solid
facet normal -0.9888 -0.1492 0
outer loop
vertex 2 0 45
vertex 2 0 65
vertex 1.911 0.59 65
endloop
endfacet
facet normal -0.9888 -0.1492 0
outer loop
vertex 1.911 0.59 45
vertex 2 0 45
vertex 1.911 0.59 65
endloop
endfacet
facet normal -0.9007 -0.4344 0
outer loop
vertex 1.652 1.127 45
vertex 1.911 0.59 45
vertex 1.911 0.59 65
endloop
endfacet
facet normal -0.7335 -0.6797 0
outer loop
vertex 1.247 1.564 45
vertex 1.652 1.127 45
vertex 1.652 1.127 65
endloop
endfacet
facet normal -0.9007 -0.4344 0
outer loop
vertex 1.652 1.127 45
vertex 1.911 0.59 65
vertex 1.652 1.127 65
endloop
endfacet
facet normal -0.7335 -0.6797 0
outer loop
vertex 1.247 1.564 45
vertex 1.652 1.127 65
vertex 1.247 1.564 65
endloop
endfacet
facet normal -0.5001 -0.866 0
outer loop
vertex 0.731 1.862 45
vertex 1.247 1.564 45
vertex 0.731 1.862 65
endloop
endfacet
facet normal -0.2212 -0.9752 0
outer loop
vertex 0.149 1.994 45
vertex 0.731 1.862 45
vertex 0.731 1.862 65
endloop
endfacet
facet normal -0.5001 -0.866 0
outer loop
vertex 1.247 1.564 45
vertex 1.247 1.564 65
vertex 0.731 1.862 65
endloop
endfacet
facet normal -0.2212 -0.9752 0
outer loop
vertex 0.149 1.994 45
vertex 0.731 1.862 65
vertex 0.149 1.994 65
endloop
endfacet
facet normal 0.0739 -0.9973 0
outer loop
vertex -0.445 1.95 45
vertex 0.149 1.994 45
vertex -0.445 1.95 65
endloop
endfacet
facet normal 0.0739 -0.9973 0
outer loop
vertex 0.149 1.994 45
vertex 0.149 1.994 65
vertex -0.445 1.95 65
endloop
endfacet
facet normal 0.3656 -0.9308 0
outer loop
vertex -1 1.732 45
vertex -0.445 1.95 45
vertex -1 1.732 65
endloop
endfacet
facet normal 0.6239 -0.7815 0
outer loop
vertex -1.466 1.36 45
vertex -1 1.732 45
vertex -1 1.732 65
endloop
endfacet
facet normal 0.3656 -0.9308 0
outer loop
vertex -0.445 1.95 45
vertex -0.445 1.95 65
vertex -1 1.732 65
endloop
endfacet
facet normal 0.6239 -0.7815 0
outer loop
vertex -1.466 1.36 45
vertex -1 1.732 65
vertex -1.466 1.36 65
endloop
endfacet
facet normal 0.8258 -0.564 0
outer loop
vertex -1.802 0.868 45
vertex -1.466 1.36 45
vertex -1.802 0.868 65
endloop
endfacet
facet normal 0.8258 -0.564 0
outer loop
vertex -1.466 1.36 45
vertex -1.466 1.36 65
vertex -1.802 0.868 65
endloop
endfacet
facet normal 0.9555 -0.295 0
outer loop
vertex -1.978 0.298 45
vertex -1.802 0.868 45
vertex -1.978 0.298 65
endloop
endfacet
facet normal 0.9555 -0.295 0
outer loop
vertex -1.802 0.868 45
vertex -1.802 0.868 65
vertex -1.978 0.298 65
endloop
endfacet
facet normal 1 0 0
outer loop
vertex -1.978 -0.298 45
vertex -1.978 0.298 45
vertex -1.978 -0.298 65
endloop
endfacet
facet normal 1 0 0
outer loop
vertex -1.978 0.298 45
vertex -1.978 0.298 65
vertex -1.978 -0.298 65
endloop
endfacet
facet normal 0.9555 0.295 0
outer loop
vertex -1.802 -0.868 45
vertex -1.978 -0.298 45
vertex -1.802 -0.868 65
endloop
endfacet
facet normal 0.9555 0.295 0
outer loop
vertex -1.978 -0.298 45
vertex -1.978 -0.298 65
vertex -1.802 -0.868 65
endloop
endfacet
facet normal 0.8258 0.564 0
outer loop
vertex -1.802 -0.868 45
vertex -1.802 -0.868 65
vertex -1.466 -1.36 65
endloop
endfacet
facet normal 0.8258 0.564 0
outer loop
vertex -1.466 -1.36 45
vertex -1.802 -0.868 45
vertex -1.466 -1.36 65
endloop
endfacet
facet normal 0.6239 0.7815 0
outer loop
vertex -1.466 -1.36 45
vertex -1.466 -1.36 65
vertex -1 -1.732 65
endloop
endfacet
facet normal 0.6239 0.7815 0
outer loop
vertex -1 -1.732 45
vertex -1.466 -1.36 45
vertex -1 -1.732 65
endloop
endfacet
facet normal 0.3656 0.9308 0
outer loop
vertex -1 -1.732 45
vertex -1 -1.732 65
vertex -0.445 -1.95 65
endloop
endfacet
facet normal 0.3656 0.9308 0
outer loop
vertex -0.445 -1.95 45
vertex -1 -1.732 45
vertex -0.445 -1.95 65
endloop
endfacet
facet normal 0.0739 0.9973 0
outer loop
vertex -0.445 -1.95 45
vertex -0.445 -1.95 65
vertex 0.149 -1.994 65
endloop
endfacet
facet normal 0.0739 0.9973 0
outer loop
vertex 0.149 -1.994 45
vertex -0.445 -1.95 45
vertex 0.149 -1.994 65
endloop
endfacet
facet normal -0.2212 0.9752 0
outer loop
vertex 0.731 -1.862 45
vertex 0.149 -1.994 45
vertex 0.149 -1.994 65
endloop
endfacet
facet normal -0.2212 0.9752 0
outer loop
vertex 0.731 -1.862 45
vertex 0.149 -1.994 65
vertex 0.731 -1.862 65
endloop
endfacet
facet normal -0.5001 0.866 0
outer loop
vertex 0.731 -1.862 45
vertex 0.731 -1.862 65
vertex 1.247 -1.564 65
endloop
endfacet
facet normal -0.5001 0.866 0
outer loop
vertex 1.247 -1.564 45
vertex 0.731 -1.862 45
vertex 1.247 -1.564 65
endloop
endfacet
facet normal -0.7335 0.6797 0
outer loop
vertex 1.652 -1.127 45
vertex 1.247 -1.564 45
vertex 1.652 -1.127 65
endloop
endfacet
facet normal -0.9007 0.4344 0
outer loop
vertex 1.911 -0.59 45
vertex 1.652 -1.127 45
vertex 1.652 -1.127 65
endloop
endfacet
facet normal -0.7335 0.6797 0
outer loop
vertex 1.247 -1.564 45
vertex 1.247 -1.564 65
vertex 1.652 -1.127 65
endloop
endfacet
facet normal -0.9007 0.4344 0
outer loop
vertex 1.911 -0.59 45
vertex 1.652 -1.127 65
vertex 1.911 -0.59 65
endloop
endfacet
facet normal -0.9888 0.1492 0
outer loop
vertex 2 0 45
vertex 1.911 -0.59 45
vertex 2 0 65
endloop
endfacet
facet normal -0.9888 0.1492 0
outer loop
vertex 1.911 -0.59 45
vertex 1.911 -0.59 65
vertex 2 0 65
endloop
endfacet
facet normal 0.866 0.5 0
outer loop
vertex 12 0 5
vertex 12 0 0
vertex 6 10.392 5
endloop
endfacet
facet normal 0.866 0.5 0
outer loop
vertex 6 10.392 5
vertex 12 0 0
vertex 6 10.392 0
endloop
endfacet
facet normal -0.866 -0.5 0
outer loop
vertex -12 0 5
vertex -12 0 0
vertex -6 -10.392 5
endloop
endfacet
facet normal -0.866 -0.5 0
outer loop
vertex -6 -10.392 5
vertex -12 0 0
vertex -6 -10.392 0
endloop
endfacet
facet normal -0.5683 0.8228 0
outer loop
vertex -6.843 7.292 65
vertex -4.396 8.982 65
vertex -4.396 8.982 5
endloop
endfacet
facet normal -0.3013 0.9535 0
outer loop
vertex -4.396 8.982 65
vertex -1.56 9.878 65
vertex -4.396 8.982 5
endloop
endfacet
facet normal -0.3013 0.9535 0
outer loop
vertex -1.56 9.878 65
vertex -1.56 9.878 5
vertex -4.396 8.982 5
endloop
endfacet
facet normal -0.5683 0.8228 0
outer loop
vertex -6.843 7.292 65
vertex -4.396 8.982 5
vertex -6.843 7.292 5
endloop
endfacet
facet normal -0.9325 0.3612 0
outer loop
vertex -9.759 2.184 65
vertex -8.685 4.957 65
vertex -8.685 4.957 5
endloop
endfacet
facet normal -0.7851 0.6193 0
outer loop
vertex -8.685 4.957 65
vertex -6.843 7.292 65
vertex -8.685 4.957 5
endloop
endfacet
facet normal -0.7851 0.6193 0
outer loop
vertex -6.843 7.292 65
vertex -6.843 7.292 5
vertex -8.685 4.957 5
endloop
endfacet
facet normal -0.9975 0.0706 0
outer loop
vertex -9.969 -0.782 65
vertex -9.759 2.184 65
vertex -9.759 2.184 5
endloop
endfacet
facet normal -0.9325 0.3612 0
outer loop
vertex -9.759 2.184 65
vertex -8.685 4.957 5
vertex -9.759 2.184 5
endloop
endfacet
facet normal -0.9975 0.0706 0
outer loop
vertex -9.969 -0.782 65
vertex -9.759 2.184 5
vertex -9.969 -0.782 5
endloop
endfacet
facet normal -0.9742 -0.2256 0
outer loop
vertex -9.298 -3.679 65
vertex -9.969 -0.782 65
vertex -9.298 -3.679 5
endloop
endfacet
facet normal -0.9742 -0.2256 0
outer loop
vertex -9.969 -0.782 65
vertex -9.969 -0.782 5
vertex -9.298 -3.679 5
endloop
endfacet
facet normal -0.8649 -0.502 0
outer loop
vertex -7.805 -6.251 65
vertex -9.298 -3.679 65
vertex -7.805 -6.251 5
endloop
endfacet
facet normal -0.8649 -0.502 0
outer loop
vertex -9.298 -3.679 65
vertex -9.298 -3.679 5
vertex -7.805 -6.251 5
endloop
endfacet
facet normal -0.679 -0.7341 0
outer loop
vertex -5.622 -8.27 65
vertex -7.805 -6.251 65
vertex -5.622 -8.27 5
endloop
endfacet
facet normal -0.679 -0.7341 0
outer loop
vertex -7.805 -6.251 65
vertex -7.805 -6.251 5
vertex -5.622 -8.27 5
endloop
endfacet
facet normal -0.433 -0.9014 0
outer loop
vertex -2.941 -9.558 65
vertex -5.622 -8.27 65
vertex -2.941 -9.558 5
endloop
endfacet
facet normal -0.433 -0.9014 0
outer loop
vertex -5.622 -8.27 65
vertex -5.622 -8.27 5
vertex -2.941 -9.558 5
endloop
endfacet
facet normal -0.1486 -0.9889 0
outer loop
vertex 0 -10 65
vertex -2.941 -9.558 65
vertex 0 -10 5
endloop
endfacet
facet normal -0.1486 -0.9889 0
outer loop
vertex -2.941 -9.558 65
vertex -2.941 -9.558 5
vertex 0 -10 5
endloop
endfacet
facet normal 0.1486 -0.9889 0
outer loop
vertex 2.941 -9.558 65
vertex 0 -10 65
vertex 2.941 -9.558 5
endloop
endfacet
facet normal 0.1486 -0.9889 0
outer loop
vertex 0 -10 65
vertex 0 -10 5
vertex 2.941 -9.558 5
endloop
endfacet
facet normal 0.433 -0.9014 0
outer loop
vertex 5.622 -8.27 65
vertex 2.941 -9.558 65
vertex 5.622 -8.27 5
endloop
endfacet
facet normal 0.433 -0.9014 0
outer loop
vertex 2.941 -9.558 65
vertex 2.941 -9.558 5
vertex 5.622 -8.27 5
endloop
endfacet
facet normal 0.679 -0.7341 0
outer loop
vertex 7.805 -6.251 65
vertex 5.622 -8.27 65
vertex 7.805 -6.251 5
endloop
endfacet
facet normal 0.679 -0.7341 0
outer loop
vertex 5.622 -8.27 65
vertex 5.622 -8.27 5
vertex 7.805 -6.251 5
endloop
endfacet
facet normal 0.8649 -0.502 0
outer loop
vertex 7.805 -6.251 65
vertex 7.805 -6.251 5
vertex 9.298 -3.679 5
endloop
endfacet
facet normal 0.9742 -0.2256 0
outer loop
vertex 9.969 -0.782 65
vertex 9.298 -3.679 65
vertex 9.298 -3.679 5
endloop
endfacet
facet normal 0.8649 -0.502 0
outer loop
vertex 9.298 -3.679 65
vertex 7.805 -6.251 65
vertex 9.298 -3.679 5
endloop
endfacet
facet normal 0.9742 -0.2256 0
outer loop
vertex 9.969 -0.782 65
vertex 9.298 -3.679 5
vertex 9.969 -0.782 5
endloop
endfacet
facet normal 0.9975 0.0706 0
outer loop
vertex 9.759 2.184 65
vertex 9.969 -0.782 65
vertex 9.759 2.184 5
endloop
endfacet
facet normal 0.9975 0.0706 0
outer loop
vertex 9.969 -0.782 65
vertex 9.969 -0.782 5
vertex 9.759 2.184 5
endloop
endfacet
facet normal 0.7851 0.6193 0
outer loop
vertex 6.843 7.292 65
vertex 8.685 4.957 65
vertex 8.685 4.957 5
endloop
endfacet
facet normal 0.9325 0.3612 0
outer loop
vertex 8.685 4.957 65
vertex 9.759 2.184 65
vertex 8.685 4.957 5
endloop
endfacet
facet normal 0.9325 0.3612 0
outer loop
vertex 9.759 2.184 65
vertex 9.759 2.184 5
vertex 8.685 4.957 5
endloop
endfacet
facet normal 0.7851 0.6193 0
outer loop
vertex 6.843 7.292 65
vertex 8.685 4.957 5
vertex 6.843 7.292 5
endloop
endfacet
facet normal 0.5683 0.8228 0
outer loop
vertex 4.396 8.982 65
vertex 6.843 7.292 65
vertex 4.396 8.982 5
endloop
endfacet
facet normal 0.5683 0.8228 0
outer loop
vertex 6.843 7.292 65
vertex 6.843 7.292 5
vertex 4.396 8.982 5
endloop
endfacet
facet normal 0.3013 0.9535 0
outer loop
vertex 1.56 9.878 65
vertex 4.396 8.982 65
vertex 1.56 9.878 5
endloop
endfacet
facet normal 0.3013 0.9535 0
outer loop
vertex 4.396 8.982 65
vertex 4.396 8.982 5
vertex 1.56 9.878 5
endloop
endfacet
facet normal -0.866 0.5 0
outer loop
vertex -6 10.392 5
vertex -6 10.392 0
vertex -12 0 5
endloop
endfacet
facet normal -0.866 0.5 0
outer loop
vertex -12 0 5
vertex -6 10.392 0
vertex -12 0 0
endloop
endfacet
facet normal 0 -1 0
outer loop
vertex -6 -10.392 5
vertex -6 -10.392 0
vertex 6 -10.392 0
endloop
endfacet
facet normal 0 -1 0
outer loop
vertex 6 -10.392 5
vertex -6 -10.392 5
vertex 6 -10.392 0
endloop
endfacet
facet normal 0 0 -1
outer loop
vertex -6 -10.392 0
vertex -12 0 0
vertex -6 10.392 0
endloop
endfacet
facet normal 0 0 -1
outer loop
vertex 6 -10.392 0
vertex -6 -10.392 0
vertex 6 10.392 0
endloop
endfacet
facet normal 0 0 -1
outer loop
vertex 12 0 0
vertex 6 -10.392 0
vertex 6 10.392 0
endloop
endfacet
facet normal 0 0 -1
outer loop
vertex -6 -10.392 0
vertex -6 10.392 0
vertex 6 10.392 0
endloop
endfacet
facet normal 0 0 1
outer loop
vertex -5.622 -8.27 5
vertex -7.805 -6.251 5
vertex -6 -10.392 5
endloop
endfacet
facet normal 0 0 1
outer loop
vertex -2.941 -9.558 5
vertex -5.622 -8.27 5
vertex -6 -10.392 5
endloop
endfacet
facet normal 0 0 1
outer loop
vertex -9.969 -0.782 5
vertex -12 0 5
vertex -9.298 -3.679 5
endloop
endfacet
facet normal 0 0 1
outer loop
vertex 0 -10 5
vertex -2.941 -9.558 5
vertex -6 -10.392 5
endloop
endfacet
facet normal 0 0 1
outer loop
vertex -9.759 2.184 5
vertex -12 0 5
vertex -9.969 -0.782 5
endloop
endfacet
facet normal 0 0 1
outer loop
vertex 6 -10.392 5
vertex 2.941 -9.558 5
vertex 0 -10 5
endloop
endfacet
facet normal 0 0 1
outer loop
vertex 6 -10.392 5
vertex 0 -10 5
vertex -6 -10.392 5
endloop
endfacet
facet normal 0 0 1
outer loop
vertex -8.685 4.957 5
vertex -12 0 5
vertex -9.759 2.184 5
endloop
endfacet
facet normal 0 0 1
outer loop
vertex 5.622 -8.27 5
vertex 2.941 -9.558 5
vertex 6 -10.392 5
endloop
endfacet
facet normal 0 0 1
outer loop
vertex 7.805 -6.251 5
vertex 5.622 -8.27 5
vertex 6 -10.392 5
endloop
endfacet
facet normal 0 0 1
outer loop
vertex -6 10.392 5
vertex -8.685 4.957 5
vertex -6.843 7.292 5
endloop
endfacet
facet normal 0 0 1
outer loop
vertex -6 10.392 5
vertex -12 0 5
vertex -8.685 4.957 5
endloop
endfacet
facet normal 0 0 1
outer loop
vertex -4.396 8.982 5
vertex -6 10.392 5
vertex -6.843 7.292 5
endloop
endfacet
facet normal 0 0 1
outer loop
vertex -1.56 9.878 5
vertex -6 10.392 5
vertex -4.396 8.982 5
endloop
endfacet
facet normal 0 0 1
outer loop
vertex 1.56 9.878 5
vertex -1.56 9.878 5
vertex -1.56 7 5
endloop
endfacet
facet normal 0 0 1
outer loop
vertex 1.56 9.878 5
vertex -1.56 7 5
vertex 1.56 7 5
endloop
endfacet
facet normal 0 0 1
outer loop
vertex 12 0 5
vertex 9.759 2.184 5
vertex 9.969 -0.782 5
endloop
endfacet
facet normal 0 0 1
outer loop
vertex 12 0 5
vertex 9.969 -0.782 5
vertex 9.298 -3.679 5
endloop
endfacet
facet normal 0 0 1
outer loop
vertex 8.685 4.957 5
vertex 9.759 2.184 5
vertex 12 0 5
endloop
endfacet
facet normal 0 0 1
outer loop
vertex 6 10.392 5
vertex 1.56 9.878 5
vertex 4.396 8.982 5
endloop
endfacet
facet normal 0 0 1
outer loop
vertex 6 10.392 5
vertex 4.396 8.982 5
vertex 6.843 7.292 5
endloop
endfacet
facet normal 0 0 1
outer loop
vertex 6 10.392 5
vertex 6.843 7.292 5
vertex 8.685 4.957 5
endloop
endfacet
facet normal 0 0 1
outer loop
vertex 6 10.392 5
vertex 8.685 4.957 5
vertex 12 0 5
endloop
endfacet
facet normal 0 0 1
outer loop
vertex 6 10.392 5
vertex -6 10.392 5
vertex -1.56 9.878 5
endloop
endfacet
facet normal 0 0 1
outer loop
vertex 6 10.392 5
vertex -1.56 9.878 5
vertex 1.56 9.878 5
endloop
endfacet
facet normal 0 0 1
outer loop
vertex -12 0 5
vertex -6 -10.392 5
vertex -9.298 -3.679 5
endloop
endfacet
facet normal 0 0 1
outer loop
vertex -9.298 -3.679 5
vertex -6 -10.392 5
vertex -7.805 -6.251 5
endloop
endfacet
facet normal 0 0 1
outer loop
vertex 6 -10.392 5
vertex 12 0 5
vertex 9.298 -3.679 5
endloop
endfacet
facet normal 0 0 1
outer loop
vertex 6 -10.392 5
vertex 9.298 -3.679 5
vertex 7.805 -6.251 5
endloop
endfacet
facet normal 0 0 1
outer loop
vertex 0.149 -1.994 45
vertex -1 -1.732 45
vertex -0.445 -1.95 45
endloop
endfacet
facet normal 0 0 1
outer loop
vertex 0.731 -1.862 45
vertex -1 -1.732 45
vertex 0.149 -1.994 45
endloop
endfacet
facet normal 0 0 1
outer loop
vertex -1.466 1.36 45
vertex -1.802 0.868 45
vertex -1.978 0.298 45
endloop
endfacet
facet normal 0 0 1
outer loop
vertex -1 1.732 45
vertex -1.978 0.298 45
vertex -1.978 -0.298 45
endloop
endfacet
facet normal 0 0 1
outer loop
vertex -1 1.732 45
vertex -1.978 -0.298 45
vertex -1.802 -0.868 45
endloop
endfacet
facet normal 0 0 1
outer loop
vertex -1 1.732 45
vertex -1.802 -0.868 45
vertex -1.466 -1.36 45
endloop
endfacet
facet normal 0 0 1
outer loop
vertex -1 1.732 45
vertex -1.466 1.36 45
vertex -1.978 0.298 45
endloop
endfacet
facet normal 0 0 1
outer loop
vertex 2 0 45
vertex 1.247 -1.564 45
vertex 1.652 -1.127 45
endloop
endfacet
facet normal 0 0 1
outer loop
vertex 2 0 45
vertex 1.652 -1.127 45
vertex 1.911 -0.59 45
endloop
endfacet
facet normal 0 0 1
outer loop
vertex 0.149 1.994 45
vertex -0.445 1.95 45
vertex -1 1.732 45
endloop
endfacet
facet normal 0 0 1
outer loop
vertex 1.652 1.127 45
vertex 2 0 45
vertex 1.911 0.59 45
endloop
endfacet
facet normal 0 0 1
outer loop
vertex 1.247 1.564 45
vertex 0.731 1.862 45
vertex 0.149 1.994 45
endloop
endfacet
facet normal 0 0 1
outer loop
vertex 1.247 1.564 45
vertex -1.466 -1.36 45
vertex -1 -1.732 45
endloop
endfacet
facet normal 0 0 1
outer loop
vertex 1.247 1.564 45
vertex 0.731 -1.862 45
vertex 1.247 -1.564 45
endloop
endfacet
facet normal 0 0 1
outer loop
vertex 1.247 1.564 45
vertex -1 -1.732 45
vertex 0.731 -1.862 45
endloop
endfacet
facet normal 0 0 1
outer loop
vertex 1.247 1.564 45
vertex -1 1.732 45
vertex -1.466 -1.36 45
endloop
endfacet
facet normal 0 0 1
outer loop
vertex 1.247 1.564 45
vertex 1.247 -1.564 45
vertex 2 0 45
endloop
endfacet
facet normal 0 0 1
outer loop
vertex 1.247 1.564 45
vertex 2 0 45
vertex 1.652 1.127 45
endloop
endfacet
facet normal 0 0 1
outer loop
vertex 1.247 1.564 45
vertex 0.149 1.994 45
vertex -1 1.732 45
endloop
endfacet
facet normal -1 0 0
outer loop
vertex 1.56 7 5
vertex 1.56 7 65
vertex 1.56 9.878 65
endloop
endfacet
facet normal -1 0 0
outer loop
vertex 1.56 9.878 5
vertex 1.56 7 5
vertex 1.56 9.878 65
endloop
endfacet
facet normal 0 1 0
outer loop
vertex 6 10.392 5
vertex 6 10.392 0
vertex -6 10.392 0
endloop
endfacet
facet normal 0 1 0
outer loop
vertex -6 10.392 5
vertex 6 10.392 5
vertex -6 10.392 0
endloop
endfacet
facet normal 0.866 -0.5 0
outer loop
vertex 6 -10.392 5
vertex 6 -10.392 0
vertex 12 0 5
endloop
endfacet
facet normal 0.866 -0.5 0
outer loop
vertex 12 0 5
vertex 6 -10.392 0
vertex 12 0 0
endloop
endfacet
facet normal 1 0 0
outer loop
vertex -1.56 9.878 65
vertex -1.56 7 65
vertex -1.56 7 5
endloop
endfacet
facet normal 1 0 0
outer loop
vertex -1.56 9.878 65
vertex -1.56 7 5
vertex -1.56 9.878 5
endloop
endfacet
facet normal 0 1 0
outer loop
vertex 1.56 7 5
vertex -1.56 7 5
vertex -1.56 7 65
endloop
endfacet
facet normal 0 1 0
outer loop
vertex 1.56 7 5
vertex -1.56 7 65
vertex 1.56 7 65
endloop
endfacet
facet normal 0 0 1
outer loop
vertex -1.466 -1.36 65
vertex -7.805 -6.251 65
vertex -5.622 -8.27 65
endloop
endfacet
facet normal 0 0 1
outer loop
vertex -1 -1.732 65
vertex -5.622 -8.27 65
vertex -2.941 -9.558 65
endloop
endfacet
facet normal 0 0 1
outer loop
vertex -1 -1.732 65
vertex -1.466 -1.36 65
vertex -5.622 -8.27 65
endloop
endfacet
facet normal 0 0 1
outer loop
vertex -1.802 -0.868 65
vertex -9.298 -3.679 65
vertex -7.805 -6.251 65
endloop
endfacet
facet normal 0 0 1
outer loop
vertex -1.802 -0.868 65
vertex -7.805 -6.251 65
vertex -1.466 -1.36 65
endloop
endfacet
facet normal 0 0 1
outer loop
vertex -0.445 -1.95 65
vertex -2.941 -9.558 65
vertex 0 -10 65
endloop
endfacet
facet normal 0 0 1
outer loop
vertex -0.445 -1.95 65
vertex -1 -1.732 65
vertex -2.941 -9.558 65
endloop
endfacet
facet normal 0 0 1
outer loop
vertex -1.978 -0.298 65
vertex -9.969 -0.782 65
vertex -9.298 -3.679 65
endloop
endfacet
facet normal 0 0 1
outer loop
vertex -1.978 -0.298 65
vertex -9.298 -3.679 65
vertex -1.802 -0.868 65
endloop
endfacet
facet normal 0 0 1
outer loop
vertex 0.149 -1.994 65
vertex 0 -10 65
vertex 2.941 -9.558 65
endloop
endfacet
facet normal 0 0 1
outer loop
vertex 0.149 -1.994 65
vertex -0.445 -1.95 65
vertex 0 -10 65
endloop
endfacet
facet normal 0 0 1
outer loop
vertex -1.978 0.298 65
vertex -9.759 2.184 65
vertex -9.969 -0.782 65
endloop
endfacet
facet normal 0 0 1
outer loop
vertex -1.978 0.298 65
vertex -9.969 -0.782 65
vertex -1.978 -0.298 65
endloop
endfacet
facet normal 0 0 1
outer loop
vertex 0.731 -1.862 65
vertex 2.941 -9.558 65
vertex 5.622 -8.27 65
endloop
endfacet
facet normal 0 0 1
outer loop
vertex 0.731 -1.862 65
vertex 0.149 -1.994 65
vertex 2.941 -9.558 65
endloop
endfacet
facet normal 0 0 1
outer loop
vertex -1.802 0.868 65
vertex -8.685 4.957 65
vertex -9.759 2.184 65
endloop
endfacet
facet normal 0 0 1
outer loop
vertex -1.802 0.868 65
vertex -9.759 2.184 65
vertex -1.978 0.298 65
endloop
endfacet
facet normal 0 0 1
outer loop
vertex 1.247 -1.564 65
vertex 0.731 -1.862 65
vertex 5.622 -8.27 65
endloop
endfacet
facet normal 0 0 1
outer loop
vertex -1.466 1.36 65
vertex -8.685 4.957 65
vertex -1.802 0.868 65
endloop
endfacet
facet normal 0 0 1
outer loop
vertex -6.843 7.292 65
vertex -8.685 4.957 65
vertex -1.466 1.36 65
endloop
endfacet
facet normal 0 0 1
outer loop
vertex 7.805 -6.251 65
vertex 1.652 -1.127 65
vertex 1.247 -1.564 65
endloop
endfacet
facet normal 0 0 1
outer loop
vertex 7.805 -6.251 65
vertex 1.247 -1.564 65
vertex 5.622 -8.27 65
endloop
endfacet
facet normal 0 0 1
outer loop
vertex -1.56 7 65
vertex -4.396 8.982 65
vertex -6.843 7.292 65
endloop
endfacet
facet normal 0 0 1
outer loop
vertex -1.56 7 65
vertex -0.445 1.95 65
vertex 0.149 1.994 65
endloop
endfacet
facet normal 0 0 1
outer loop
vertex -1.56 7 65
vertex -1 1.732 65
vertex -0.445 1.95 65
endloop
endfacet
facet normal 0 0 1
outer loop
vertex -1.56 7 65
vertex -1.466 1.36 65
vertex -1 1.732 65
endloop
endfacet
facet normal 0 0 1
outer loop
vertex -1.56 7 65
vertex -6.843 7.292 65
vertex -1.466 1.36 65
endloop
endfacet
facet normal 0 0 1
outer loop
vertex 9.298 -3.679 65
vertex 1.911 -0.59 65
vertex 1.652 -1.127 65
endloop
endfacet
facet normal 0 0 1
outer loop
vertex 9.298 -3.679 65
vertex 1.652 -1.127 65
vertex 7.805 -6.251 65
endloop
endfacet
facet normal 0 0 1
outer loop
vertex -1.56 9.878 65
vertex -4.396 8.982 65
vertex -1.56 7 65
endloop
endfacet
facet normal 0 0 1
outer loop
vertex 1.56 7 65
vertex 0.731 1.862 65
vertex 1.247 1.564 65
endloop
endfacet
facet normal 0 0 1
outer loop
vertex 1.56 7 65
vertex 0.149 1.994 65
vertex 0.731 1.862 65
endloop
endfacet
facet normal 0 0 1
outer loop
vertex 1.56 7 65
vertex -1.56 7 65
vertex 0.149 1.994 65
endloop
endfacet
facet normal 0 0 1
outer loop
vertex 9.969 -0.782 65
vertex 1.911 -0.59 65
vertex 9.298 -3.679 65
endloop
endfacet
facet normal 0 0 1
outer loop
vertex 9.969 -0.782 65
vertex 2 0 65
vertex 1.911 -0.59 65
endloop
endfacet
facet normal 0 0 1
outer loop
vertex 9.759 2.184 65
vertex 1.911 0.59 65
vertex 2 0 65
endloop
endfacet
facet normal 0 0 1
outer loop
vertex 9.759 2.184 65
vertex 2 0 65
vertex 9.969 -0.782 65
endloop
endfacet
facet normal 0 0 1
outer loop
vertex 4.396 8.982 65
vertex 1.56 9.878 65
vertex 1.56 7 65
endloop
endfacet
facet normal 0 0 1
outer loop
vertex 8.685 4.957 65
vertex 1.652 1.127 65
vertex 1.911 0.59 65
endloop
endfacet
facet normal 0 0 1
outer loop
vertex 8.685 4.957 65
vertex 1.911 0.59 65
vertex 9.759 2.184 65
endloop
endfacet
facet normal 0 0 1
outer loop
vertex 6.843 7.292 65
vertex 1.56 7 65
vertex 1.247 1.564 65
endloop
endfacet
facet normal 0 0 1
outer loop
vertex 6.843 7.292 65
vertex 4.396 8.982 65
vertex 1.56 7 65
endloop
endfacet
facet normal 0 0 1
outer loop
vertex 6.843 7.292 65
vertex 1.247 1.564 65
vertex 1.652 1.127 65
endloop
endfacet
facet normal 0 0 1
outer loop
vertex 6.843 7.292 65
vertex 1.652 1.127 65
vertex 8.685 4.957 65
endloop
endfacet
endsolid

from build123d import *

# Parameters (mm, degrees)
BOSS_EXTRUDE3_DEPTH = 5
SKETCH5_R           = 10
BOSS_EXTRUDE4_DEPTH = 60
SKETCH6_R           = 2
CUT_EXTRUDE1_DEPTH  = 20
SKETCH9_W           = 3.11933689
SKETCH9_H           = 7.065160472
CUT_EXTRUDE3_DEPTH  = 60


with BuildPart() as part:
    # Sketch3 → Boss-Extrude3 (new body)
    with BuildSketch(Plane.XY):
        Polygon((6, 10.392304845), (-6, 10.392304845), (-12, 0), (-6, -10.392304845), (6, -10.392304845), (12, 0), align=None)
    extrude(amount=BOSS_EXTRUDE3_DEPTH)

    # Sketch5 → Boss-Extrude4 (add)
    with BuildSketch(Plane.XY.offset(5)):
        Circle(SKETCH5_R)
    extrude(amount=BOSS_EXTRUDE4_DEPTH)

    # Sketch6 → Cut-Extrude1 (cut)
    with BuildSketch(Plane.XY.offset(65)):
        Circle(SKETCH6_R)
    extrude(amount=-CUT_EXTRUDE1_DEPTH, mode=Mode.SUBTRACT)

    # Sketch9 → Cut-Extrude3 (cut)
    with BuildSketch(Plane.XY.offset(65)):
        with Locations((0, 10.532580236)):
            Rectangle(SKETCH9_W, SKETCH9_H)
    extrude(amount=-CUT_EXTRUDE3_DEPTH, mode=Mode.SUBTRACT)


solid = part.part
